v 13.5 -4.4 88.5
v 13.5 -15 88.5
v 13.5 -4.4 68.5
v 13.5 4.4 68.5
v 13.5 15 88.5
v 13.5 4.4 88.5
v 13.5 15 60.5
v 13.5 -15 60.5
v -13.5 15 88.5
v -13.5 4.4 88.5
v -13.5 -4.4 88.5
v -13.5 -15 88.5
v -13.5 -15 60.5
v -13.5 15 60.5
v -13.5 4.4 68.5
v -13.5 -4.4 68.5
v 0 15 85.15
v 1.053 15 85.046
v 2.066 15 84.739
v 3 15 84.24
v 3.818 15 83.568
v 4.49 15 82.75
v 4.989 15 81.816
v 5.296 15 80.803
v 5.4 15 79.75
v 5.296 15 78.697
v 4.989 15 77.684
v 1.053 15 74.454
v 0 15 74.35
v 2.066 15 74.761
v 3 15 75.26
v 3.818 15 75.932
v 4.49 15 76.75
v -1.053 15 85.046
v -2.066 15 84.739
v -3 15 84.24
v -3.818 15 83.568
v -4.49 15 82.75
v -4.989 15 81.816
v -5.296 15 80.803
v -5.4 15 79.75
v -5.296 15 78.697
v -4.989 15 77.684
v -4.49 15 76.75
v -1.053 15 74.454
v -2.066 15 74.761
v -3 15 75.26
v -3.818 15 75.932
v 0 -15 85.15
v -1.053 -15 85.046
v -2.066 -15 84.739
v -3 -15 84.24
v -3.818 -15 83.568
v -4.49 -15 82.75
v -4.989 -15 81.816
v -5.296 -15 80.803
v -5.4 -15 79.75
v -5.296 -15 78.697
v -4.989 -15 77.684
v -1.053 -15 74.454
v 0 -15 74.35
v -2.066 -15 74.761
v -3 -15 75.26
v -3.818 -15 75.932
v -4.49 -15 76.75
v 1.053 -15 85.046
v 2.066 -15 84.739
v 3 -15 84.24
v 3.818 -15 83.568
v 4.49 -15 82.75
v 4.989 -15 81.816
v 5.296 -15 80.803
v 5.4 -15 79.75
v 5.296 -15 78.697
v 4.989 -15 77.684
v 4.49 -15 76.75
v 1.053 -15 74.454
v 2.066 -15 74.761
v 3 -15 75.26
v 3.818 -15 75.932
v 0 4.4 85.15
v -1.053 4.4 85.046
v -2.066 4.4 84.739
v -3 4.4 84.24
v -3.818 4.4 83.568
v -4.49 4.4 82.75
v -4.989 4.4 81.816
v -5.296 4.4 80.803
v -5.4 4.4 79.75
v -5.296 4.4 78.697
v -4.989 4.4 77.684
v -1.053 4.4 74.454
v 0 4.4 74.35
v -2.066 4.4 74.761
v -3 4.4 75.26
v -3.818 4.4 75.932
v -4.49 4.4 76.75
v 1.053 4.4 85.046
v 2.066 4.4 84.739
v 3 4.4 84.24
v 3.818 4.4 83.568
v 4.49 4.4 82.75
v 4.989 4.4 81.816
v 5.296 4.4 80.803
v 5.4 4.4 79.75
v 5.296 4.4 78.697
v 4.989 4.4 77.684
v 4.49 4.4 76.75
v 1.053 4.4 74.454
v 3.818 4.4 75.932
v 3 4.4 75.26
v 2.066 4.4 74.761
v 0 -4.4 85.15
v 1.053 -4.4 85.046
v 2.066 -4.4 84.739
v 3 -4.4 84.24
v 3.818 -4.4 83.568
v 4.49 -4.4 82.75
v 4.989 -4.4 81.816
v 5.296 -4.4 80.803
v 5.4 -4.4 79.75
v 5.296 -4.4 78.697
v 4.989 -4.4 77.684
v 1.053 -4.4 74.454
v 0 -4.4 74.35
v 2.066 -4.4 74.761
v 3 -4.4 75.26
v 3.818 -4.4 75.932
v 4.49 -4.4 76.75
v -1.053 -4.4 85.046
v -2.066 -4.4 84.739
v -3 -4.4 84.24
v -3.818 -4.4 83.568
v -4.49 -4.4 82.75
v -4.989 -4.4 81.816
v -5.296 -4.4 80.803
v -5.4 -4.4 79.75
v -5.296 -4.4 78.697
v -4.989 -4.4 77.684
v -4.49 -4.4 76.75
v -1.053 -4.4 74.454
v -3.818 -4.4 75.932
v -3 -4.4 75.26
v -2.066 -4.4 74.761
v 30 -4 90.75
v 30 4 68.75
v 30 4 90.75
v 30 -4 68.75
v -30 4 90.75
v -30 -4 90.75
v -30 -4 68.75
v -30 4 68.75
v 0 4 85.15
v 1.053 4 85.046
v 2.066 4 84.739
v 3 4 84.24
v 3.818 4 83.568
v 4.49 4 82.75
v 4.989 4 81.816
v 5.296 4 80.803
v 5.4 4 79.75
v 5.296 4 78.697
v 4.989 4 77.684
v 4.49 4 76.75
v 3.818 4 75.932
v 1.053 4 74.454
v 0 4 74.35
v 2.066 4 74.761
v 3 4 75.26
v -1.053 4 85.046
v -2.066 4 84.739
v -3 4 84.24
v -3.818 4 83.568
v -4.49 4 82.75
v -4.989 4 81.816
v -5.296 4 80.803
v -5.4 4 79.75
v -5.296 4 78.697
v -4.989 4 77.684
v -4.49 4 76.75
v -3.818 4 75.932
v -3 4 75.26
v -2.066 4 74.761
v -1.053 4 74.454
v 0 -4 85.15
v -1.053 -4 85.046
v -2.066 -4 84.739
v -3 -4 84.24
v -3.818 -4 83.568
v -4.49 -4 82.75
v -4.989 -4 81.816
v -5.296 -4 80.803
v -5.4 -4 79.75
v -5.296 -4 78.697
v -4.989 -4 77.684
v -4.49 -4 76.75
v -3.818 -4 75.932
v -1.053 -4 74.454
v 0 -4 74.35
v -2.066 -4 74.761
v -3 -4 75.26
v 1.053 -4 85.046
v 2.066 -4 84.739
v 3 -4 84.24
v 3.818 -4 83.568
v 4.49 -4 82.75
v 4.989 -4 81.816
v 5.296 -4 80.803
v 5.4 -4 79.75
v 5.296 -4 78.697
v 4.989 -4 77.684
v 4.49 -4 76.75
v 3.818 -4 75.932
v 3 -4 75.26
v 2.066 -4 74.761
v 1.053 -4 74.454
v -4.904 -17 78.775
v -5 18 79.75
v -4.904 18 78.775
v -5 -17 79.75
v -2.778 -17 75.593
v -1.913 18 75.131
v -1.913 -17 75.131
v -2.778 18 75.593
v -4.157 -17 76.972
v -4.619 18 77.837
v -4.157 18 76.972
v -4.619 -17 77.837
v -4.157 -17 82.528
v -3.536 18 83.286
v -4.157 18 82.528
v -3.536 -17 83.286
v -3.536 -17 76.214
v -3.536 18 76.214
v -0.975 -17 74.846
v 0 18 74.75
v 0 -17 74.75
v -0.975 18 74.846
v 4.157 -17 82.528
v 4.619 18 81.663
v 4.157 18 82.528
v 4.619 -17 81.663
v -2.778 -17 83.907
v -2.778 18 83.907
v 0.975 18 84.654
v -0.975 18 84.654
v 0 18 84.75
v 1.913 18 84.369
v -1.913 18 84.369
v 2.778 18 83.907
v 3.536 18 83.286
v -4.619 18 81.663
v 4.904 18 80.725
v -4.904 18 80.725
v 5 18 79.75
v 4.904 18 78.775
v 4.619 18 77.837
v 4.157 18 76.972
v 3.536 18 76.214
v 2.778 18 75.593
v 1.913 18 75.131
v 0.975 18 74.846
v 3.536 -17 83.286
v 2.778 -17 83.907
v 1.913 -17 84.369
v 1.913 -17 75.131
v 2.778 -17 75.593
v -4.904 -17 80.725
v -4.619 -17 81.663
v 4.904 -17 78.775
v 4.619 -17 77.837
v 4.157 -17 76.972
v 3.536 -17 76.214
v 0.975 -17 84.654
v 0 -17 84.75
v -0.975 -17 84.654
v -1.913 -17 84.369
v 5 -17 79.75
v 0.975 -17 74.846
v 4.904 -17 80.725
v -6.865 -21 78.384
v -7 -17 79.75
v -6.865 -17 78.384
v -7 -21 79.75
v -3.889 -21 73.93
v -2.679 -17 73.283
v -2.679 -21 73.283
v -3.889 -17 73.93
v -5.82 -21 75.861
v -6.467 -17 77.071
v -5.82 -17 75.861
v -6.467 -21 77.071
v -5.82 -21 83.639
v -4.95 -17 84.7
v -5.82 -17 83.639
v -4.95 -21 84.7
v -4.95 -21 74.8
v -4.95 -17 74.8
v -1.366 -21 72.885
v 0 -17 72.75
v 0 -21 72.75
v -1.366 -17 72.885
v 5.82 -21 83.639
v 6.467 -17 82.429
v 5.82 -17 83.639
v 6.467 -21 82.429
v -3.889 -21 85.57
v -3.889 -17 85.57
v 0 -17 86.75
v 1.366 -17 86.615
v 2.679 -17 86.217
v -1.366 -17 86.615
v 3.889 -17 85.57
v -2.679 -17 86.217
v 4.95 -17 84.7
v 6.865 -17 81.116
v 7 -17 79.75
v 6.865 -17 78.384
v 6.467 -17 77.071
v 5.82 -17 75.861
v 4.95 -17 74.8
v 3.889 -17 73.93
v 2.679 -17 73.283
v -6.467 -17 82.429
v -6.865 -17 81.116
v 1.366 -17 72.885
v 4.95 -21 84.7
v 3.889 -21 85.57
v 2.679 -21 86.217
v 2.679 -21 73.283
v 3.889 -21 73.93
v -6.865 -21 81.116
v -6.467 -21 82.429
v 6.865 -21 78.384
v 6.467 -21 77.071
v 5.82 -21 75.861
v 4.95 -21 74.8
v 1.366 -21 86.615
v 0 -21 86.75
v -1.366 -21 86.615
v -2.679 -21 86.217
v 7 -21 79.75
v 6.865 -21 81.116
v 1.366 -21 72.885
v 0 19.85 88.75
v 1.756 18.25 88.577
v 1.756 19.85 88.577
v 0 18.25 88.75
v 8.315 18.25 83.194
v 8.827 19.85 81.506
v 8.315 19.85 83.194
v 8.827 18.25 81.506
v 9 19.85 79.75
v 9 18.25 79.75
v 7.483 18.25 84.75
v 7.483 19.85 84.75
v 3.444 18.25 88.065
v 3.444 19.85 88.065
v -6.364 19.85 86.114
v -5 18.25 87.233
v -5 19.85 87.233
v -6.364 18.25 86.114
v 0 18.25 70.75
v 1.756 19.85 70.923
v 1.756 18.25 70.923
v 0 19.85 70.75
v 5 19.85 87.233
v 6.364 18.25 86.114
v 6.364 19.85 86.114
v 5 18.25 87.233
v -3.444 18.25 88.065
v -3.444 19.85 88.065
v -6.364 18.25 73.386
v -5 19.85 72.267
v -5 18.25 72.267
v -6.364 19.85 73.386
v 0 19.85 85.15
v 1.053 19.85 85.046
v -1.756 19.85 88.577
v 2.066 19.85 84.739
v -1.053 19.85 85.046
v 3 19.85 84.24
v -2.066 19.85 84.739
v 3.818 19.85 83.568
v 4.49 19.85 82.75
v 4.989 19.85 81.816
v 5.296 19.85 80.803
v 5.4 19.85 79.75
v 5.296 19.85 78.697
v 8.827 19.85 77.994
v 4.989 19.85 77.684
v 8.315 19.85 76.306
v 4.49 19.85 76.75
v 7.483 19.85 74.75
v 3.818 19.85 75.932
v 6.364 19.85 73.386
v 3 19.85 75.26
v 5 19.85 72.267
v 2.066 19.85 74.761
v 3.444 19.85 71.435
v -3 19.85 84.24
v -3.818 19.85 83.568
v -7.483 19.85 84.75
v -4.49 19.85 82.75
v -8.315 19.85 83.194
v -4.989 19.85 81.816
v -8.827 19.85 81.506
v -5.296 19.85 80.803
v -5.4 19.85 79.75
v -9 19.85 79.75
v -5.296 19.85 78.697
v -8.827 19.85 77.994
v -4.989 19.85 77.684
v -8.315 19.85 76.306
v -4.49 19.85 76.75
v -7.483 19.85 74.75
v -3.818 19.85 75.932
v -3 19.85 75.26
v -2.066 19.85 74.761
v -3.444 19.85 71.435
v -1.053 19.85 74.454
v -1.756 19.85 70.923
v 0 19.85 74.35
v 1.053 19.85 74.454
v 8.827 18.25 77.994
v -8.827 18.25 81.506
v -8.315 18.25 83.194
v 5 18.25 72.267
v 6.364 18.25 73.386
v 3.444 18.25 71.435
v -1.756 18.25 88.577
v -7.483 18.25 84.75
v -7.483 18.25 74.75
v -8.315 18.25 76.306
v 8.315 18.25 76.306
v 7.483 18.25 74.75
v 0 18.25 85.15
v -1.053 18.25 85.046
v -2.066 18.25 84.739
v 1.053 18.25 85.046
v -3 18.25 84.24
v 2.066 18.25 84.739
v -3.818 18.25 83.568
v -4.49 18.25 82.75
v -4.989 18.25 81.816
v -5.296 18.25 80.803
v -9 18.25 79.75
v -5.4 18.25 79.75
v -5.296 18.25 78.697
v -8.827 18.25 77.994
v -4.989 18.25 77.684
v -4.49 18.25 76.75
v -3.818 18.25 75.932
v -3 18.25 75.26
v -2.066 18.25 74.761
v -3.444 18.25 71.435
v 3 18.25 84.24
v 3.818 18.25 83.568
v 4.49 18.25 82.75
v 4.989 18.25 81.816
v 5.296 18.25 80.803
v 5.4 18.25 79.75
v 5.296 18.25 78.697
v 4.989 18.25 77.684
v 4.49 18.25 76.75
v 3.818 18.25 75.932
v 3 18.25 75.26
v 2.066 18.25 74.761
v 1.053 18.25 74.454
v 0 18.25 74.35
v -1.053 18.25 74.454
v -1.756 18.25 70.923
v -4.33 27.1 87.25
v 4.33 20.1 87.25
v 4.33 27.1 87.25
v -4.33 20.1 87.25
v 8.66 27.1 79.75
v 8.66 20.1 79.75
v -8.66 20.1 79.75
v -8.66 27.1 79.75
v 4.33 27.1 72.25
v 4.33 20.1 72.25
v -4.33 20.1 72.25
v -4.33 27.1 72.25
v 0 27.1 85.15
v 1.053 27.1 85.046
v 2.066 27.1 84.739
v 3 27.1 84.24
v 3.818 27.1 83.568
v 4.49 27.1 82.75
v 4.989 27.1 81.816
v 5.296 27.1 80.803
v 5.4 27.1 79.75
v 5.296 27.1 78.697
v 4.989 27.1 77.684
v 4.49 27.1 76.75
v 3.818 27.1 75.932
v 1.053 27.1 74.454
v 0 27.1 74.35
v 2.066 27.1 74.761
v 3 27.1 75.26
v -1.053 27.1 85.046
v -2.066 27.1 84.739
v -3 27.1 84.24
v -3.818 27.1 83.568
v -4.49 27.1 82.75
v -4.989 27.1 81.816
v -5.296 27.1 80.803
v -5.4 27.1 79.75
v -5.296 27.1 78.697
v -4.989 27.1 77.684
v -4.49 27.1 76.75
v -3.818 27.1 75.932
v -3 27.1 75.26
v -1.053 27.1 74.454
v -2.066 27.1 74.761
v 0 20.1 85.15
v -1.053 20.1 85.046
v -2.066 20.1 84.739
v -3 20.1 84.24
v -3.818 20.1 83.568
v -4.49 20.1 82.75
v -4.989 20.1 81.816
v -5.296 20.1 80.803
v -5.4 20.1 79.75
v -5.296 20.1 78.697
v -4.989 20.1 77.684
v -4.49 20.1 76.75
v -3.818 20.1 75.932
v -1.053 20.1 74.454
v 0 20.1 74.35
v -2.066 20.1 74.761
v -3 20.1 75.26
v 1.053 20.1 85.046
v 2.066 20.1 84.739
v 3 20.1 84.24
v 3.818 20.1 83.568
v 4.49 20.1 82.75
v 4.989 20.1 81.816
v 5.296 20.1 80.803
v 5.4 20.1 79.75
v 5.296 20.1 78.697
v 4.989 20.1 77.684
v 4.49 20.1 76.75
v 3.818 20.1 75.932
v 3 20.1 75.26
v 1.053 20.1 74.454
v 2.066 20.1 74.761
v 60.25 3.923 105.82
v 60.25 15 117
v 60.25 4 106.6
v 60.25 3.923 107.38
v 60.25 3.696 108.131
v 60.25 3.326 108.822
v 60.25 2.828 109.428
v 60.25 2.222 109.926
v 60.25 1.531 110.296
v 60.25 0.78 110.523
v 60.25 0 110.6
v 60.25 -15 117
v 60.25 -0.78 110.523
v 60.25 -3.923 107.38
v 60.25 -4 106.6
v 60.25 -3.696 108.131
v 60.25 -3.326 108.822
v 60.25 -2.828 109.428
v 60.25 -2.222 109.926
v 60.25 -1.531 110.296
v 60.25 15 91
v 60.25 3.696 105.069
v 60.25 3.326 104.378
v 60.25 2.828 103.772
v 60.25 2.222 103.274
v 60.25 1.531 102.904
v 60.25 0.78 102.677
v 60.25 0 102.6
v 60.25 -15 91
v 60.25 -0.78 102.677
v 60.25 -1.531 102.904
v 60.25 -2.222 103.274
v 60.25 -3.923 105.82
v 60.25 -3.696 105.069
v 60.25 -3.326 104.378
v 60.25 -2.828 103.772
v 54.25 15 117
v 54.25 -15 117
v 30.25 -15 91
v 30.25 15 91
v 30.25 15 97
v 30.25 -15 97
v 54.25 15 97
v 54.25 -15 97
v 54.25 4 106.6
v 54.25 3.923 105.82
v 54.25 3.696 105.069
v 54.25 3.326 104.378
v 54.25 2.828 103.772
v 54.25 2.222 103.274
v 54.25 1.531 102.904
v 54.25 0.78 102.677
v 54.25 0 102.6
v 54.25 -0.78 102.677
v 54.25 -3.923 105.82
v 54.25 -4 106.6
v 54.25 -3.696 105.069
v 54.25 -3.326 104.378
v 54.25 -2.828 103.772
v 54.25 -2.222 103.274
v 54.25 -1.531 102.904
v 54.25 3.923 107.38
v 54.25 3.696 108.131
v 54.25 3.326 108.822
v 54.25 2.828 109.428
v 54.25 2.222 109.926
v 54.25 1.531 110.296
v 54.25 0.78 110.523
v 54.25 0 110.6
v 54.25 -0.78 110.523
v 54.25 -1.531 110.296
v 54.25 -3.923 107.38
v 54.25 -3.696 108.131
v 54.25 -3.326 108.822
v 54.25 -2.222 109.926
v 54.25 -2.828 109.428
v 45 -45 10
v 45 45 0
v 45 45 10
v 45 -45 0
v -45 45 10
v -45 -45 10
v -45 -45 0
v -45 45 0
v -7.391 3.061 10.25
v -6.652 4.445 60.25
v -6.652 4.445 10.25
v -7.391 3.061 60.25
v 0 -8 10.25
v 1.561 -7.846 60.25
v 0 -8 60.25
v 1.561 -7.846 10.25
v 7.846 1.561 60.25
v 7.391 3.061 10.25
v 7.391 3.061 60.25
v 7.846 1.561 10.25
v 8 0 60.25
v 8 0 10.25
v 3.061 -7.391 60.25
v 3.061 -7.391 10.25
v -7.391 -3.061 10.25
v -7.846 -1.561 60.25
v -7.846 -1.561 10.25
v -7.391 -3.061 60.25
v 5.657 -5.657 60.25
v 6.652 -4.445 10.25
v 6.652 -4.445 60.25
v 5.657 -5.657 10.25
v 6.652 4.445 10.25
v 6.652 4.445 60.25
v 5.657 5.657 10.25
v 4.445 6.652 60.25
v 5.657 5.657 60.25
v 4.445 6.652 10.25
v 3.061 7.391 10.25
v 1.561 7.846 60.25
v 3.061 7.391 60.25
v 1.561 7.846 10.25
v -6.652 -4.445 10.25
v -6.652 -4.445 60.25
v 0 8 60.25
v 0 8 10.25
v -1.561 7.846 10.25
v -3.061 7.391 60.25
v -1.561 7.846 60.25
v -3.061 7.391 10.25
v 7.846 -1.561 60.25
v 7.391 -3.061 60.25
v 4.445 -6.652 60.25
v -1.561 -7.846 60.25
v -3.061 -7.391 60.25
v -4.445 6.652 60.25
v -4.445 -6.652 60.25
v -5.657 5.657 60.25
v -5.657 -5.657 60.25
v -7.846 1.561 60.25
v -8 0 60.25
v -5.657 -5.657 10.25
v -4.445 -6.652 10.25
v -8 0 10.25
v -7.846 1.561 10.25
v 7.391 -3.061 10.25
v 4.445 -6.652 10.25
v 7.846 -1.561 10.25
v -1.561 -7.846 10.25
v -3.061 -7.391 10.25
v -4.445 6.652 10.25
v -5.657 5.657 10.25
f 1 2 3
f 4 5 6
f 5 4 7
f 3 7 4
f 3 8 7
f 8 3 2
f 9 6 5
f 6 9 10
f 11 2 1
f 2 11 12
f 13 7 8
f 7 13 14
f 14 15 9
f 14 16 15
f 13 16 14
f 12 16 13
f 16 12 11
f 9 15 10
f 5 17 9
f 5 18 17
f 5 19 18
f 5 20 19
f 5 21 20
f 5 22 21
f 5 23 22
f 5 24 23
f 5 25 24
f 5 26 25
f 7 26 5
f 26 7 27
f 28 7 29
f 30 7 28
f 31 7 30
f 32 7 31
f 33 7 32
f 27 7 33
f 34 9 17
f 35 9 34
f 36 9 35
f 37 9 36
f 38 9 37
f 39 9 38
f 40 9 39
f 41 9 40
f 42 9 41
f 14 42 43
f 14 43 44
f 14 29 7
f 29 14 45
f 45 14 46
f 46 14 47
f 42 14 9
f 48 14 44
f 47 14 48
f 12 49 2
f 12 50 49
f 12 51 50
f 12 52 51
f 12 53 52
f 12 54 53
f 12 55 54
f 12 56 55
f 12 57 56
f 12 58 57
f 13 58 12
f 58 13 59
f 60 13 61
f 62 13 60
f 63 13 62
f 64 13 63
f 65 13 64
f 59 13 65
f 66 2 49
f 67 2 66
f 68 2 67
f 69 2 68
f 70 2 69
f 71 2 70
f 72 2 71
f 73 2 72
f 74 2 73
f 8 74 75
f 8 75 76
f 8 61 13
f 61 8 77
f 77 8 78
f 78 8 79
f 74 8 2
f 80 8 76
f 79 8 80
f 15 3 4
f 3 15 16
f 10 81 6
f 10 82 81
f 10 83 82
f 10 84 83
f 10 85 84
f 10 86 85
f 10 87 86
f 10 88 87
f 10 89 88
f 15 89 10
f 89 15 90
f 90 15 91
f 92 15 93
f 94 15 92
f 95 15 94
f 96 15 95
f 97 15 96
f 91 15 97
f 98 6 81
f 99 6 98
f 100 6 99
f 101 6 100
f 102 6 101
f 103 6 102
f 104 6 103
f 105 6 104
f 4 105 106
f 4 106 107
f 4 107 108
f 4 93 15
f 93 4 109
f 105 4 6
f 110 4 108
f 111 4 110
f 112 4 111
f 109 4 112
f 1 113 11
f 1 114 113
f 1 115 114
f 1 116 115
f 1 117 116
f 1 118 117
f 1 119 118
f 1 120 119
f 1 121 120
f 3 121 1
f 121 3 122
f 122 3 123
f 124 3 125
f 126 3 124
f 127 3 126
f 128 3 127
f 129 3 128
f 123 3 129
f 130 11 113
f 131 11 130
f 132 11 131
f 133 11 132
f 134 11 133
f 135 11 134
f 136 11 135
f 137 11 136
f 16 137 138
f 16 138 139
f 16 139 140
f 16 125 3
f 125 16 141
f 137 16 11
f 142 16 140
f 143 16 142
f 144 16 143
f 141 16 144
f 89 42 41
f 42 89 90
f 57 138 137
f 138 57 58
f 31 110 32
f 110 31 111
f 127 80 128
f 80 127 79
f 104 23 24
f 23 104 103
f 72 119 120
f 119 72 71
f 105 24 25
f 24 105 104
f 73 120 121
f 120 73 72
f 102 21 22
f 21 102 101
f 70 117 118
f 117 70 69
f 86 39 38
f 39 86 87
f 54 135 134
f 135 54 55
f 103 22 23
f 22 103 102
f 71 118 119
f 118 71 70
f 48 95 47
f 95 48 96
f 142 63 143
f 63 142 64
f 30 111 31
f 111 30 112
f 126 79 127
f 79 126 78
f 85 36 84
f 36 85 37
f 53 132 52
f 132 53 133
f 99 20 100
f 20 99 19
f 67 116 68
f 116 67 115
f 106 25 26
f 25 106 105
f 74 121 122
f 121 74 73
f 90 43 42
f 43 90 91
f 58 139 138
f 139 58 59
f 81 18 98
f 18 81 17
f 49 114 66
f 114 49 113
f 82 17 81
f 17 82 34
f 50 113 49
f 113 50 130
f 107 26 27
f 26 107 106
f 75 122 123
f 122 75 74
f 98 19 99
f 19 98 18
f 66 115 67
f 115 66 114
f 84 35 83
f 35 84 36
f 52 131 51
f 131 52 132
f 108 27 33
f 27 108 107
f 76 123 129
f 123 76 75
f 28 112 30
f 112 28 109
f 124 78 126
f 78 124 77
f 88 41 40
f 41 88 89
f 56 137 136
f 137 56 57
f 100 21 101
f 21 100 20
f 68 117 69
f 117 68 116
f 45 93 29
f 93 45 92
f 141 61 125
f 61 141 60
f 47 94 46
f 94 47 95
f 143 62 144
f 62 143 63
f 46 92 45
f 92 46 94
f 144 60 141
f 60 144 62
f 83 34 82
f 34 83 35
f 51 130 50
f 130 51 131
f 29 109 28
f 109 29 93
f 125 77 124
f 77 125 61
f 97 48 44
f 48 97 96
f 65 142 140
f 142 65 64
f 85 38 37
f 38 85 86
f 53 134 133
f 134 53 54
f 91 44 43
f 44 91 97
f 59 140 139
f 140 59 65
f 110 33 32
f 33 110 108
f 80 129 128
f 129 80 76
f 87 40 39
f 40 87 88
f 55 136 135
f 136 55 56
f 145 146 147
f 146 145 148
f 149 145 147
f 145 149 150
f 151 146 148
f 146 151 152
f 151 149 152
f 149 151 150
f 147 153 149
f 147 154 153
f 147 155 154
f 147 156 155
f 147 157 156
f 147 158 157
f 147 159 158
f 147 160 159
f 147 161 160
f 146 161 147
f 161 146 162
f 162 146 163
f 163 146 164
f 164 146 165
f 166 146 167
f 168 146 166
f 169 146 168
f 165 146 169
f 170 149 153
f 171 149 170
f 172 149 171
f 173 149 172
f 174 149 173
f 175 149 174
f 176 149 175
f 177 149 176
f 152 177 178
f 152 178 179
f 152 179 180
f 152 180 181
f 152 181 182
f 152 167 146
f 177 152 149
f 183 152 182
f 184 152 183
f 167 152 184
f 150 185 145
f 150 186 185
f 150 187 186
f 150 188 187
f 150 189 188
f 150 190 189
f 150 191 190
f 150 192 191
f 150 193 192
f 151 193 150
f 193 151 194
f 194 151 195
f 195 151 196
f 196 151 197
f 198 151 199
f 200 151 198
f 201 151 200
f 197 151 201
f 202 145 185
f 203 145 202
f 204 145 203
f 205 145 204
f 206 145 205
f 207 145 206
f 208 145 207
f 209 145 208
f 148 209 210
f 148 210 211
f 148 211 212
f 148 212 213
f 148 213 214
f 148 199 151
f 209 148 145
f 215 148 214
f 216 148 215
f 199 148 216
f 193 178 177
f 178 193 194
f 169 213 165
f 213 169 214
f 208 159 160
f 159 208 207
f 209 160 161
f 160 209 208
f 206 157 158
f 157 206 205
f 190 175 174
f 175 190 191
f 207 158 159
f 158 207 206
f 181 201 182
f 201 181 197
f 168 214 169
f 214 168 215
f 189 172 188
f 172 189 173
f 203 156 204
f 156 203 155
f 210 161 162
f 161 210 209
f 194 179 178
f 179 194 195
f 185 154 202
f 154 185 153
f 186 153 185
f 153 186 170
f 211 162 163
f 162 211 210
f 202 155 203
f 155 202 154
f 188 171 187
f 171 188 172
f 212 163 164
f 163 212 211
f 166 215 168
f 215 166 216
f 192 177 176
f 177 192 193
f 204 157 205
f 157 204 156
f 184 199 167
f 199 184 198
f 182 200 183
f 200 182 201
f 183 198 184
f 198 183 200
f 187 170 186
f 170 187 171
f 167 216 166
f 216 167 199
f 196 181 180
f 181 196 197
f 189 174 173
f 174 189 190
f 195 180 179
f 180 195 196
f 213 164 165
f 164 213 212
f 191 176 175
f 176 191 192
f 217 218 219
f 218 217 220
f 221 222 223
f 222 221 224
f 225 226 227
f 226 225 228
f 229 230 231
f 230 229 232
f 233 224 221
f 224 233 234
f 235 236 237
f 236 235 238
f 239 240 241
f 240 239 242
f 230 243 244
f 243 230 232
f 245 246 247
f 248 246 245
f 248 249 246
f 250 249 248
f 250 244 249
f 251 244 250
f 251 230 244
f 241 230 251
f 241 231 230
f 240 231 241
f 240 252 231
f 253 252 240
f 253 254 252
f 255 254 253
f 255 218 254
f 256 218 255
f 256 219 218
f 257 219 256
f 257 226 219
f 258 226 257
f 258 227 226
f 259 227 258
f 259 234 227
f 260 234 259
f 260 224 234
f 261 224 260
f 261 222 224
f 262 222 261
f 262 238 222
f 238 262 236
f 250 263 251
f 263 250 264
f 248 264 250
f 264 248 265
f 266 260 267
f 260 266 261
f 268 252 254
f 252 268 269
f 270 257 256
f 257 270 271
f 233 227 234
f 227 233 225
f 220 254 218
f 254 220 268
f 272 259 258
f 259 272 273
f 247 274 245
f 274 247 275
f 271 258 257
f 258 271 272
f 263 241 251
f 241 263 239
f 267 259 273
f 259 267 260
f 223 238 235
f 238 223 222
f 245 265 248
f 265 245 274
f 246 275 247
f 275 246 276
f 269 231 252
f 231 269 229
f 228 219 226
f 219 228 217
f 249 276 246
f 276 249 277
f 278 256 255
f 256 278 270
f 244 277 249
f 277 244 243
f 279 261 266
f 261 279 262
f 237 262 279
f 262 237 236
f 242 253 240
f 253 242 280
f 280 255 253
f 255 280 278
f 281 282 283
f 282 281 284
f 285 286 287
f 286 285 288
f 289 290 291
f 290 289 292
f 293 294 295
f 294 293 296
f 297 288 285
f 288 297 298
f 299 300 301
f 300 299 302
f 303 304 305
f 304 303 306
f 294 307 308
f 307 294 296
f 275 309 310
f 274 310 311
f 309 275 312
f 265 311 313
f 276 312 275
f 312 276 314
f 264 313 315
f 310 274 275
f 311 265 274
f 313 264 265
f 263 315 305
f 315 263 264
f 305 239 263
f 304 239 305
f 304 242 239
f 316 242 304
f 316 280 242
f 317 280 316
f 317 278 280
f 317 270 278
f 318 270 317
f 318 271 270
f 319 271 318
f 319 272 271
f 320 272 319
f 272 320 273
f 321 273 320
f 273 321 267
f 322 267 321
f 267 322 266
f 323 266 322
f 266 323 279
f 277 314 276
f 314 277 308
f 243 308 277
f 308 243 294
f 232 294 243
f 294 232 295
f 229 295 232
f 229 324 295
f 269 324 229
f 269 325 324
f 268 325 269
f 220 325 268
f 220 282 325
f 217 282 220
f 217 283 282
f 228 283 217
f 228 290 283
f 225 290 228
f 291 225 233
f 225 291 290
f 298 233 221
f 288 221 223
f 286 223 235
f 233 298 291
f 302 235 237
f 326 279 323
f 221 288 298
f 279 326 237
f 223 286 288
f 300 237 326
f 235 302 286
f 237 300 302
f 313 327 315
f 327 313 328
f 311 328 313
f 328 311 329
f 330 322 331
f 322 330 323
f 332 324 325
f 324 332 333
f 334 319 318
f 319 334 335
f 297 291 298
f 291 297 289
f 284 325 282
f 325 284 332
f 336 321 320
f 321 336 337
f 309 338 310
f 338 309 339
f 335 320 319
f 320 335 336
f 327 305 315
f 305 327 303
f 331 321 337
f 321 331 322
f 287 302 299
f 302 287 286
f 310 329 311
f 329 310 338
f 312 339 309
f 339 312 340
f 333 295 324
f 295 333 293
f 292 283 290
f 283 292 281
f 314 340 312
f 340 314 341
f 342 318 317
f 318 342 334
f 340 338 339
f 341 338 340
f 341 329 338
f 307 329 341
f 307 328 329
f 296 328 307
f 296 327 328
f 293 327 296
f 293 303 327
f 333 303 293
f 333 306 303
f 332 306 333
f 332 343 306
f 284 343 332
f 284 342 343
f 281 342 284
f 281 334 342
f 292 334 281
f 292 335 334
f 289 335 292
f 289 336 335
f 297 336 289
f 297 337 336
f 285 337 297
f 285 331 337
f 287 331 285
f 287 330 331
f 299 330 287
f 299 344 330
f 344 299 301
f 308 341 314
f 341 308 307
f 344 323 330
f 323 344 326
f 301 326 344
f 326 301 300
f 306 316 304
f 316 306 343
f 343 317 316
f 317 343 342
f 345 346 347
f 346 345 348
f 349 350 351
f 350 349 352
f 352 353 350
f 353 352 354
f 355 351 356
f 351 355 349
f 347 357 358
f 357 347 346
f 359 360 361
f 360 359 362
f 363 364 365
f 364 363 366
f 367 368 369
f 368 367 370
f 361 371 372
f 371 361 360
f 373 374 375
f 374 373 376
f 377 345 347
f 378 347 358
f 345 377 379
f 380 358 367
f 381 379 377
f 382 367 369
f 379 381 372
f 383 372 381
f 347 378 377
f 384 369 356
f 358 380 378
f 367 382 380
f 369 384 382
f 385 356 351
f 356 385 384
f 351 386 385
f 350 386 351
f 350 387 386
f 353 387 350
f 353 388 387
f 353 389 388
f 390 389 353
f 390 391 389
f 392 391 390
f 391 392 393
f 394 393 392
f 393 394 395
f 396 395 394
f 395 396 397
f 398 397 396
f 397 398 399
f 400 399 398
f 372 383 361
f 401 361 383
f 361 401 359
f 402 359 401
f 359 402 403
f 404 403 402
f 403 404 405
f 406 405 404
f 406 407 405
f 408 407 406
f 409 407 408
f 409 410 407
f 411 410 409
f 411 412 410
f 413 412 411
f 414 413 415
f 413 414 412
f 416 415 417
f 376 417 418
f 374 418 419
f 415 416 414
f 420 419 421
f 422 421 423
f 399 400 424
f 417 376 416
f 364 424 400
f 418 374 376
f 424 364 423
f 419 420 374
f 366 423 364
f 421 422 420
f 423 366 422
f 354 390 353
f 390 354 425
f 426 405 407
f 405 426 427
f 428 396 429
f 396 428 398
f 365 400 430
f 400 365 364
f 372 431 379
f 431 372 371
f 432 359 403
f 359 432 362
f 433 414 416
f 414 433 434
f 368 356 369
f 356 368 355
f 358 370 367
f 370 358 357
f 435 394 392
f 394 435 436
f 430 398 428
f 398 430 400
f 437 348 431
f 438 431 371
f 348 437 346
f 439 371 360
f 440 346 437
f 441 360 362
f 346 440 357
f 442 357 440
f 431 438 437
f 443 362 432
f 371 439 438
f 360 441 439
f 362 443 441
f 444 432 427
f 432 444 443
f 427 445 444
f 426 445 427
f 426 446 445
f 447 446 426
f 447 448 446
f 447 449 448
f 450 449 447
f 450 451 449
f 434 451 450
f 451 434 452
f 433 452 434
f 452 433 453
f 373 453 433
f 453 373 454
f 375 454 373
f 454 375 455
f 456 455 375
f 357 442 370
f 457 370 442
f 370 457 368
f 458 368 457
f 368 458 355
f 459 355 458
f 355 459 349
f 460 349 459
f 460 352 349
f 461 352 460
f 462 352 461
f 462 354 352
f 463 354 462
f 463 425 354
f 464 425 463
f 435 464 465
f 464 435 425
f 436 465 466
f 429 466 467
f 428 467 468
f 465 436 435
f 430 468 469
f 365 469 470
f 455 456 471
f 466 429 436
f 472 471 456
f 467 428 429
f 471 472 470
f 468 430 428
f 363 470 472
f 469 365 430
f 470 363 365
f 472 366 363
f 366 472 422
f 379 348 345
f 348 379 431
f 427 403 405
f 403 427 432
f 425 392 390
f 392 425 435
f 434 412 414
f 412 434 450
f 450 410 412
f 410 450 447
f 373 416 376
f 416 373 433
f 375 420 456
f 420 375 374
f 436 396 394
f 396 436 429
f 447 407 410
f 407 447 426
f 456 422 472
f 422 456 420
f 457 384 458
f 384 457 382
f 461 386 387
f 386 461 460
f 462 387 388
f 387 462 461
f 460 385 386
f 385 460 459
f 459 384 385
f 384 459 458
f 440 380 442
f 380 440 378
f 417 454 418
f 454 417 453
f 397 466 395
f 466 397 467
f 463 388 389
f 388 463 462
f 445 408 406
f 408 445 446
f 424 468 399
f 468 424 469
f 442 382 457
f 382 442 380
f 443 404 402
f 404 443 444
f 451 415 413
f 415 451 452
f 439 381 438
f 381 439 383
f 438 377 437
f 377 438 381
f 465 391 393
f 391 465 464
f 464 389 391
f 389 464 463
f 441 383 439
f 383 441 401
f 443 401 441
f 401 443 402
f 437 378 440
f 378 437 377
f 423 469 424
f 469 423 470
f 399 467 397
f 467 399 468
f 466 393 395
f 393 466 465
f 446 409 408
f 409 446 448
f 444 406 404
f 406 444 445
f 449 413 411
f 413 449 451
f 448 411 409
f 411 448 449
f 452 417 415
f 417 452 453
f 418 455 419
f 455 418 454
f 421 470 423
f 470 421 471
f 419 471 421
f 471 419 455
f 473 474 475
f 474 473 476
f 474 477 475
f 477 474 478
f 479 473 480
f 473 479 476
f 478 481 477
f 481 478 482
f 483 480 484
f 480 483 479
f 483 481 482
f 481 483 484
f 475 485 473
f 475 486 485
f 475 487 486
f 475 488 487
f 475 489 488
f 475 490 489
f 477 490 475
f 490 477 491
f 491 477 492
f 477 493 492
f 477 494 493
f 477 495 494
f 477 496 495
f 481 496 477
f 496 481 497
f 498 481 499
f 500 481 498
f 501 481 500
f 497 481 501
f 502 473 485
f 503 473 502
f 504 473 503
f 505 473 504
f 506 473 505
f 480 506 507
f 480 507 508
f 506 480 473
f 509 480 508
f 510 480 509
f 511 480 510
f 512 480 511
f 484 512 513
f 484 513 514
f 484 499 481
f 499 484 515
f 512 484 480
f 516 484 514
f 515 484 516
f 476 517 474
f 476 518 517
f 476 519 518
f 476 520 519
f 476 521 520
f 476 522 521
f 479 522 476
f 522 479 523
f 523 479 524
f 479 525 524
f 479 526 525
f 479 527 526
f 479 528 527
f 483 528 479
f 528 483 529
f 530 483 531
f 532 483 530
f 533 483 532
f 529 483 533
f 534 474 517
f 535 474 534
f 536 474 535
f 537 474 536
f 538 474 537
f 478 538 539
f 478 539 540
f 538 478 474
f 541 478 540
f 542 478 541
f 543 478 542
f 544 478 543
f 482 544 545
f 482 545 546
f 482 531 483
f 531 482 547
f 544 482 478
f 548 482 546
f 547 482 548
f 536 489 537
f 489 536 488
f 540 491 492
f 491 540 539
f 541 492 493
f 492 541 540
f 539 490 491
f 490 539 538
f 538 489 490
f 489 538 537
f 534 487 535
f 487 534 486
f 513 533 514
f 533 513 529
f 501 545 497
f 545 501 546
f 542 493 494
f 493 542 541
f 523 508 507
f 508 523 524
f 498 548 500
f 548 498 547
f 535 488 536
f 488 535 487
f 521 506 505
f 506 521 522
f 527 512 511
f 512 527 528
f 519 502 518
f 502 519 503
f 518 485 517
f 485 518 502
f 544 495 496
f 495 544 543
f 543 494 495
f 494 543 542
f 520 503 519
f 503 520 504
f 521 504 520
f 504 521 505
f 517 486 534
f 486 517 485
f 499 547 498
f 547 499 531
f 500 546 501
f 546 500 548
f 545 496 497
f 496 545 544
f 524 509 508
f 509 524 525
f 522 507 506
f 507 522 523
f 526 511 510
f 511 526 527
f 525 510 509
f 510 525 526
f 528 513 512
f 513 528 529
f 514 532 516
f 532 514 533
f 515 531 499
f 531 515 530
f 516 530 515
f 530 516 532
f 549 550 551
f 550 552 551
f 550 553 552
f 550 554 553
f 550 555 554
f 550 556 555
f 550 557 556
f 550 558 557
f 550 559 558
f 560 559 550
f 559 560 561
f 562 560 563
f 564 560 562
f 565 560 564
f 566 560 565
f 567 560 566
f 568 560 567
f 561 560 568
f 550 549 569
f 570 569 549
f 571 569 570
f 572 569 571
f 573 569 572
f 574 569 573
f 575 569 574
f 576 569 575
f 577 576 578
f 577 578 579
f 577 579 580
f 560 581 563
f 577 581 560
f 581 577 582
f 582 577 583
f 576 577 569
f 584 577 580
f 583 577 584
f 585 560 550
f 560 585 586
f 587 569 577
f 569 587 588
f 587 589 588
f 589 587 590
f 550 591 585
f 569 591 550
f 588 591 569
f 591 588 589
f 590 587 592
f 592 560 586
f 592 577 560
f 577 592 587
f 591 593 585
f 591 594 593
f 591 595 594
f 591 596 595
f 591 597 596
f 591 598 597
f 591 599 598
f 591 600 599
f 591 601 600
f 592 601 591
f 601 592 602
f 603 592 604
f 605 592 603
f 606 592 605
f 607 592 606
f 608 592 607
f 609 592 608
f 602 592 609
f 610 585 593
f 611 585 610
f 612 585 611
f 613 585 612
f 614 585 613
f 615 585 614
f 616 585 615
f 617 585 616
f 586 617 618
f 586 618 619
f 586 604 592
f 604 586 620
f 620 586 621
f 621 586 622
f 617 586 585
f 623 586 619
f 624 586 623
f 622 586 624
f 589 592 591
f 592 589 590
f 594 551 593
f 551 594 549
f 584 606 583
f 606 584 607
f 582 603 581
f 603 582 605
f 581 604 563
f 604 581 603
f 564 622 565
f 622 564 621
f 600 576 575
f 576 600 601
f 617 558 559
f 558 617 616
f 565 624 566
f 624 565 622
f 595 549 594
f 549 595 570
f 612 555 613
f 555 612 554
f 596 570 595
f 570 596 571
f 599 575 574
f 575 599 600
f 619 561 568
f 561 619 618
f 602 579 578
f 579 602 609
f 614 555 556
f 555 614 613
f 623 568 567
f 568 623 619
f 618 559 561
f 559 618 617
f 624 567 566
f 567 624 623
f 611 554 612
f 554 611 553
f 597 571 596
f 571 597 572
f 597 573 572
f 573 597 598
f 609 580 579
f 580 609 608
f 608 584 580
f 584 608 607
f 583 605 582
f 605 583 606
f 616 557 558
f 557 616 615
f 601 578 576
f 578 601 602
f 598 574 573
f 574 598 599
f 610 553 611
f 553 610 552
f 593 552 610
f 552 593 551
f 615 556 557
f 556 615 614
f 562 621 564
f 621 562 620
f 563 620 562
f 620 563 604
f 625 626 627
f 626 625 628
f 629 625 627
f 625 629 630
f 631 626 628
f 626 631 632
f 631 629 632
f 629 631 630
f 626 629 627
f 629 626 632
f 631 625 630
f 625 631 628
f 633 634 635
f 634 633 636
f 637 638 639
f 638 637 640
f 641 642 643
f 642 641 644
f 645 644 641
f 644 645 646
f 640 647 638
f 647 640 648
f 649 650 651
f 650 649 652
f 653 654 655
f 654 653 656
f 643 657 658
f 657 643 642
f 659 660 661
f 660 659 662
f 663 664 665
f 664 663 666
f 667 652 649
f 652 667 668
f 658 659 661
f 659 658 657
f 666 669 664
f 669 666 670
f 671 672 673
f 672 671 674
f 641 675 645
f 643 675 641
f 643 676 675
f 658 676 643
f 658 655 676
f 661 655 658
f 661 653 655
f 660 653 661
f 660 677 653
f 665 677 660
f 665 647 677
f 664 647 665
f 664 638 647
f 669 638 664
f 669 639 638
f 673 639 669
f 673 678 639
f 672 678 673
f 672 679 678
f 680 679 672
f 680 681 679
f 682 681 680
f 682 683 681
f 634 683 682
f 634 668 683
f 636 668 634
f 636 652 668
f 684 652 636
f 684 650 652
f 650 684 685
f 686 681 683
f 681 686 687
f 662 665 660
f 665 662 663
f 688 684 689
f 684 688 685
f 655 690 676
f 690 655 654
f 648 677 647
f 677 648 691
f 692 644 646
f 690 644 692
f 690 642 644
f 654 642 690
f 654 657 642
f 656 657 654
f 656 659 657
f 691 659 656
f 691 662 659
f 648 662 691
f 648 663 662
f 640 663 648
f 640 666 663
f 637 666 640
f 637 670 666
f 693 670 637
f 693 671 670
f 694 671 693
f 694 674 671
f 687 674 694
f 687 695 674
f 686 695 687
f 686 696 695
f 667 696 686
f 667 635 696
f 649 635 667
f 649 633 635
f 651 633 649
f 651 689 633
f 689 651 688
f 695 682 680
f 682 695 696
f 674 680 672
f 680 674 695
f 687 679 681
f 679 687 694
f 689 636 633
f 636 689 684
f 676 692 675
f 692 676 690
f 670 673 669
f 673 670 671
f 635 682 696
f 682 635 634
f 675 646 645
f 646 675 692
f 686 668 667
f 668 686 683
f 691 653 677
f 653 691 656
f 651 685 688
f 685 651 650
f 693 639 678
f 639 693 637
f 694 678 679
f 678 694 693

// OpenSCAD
$fn = 32;

// ------------------------------------------------------------------------
// Lamp arm: column d16 x 50 mm, arm 60 mm
// Every part is its own module, assembly() places every instance.
// ------------------------------------------------------------------------

// --- part 1 ---
module lamp_base() {
  difference() {
    translate([-45, -45, 0]) cube([90, 90, 10]);
  }
}

// --- part 2 ---
module lamp_column() {
  cylinder(h = 50, d = 16);
}

// --- part 3 ---
module head_fork() {
  difference() {
    translate([-13.5, -15, 0]) cube([27, 30, 28]);
    translate([-14.5, -4.4, 8]) cube([29, 8.8, 21]);
    translate([0, 0, 19.25]) rotate([90, 0, 0]) cylinder(h = 32, d = 10.8, center = true);
  }
}

// --- part 4 ---
module lamp_arm() {
  difference() {
    translate([-30, -4, 0]) cube([60, 8, 22]);
    translate([0, 0, 11]) rotate([90, 0, 0]) cylinder(h = 10, d = 10.8, center = true);
  }
}

// --- part 5 ---
module arm_pin() {
  rotate([0, 90, 0]) cylinder(h = 36, d = 10, center = true);
  translate([-21, 0, 0]) rotate([0, 90, 0]) cylinder(h = 4, d = 14);
}

// --- part 6 ---
module arm_washer() {
  difference() {
      translate([0, 0, 0]) cylinder(h = 1.6, d = 18);
      translate([0, 0, -1]) cylinder(h = 3.6, d = 10.8);
    }
}

// --- part 7 ---
module arm_nut() {
  difference() {
    linear_extrude(height = 7) polygon(points = [[8.66, 0], [4.33, 7.5], [-4.33, 7.5], [-8.66, 0], [-4.33, -7.5], [4.33, -7.5]]);
    translate([0, 0, -1]) cylinder(h = 9, d = 10.8);
  }
}

// --- part 8 ---
module shade_bracket() {
  difference() {
    translate([-15, -15, 0]) cube([30, 30, 26]);
    translate([-16, -16, 6]) cube([25, 32, 21]);
    translate([12, 0, 15.6]) rotate([0, 90, 0]) cylinder(h = 8, d = 8, center = true);
  }
}

// --- assembly ---
module assembly() {
  color([0.80, 0.24, 0.20]) translate([0, 0, 0]) rotate([0, 0, 0]) lamp_base();
  color([0.20, 0.45, 0.75]) translate([0, 0, 10.25]) rotate([0, 0, 0]) lamp_column();
  color([0.25, 0.62, 0.32]) translate([0, 0, 60.5]) rotate([0, 0, 0]) head_fork();
  color([0.92, 0.70, 0.18]) translate([0, 0, 68.75]) rotate([0, 0, 0]) lamp_arm();
  color([0.58, 0.35, 0.70]) translate([0, 0, 79.75]) rotate([0, 0, 90]) arm_pin();
  color([0.16, 0.66, 0.66]) translate([0, 19.85, 79.75]) rotate([90, 0, 0]) arm_washer();
  color([0.85, 0.48, 0.18]) translate([0, 27.1, 79.75]) rotate([90, 0, 0]) arm_nut();
  color([0.55, 0.60, 0.65]) translate([45.25, 0, 91]) rotate([0, 0, 0]) shade_bracket();
}

assembly();
